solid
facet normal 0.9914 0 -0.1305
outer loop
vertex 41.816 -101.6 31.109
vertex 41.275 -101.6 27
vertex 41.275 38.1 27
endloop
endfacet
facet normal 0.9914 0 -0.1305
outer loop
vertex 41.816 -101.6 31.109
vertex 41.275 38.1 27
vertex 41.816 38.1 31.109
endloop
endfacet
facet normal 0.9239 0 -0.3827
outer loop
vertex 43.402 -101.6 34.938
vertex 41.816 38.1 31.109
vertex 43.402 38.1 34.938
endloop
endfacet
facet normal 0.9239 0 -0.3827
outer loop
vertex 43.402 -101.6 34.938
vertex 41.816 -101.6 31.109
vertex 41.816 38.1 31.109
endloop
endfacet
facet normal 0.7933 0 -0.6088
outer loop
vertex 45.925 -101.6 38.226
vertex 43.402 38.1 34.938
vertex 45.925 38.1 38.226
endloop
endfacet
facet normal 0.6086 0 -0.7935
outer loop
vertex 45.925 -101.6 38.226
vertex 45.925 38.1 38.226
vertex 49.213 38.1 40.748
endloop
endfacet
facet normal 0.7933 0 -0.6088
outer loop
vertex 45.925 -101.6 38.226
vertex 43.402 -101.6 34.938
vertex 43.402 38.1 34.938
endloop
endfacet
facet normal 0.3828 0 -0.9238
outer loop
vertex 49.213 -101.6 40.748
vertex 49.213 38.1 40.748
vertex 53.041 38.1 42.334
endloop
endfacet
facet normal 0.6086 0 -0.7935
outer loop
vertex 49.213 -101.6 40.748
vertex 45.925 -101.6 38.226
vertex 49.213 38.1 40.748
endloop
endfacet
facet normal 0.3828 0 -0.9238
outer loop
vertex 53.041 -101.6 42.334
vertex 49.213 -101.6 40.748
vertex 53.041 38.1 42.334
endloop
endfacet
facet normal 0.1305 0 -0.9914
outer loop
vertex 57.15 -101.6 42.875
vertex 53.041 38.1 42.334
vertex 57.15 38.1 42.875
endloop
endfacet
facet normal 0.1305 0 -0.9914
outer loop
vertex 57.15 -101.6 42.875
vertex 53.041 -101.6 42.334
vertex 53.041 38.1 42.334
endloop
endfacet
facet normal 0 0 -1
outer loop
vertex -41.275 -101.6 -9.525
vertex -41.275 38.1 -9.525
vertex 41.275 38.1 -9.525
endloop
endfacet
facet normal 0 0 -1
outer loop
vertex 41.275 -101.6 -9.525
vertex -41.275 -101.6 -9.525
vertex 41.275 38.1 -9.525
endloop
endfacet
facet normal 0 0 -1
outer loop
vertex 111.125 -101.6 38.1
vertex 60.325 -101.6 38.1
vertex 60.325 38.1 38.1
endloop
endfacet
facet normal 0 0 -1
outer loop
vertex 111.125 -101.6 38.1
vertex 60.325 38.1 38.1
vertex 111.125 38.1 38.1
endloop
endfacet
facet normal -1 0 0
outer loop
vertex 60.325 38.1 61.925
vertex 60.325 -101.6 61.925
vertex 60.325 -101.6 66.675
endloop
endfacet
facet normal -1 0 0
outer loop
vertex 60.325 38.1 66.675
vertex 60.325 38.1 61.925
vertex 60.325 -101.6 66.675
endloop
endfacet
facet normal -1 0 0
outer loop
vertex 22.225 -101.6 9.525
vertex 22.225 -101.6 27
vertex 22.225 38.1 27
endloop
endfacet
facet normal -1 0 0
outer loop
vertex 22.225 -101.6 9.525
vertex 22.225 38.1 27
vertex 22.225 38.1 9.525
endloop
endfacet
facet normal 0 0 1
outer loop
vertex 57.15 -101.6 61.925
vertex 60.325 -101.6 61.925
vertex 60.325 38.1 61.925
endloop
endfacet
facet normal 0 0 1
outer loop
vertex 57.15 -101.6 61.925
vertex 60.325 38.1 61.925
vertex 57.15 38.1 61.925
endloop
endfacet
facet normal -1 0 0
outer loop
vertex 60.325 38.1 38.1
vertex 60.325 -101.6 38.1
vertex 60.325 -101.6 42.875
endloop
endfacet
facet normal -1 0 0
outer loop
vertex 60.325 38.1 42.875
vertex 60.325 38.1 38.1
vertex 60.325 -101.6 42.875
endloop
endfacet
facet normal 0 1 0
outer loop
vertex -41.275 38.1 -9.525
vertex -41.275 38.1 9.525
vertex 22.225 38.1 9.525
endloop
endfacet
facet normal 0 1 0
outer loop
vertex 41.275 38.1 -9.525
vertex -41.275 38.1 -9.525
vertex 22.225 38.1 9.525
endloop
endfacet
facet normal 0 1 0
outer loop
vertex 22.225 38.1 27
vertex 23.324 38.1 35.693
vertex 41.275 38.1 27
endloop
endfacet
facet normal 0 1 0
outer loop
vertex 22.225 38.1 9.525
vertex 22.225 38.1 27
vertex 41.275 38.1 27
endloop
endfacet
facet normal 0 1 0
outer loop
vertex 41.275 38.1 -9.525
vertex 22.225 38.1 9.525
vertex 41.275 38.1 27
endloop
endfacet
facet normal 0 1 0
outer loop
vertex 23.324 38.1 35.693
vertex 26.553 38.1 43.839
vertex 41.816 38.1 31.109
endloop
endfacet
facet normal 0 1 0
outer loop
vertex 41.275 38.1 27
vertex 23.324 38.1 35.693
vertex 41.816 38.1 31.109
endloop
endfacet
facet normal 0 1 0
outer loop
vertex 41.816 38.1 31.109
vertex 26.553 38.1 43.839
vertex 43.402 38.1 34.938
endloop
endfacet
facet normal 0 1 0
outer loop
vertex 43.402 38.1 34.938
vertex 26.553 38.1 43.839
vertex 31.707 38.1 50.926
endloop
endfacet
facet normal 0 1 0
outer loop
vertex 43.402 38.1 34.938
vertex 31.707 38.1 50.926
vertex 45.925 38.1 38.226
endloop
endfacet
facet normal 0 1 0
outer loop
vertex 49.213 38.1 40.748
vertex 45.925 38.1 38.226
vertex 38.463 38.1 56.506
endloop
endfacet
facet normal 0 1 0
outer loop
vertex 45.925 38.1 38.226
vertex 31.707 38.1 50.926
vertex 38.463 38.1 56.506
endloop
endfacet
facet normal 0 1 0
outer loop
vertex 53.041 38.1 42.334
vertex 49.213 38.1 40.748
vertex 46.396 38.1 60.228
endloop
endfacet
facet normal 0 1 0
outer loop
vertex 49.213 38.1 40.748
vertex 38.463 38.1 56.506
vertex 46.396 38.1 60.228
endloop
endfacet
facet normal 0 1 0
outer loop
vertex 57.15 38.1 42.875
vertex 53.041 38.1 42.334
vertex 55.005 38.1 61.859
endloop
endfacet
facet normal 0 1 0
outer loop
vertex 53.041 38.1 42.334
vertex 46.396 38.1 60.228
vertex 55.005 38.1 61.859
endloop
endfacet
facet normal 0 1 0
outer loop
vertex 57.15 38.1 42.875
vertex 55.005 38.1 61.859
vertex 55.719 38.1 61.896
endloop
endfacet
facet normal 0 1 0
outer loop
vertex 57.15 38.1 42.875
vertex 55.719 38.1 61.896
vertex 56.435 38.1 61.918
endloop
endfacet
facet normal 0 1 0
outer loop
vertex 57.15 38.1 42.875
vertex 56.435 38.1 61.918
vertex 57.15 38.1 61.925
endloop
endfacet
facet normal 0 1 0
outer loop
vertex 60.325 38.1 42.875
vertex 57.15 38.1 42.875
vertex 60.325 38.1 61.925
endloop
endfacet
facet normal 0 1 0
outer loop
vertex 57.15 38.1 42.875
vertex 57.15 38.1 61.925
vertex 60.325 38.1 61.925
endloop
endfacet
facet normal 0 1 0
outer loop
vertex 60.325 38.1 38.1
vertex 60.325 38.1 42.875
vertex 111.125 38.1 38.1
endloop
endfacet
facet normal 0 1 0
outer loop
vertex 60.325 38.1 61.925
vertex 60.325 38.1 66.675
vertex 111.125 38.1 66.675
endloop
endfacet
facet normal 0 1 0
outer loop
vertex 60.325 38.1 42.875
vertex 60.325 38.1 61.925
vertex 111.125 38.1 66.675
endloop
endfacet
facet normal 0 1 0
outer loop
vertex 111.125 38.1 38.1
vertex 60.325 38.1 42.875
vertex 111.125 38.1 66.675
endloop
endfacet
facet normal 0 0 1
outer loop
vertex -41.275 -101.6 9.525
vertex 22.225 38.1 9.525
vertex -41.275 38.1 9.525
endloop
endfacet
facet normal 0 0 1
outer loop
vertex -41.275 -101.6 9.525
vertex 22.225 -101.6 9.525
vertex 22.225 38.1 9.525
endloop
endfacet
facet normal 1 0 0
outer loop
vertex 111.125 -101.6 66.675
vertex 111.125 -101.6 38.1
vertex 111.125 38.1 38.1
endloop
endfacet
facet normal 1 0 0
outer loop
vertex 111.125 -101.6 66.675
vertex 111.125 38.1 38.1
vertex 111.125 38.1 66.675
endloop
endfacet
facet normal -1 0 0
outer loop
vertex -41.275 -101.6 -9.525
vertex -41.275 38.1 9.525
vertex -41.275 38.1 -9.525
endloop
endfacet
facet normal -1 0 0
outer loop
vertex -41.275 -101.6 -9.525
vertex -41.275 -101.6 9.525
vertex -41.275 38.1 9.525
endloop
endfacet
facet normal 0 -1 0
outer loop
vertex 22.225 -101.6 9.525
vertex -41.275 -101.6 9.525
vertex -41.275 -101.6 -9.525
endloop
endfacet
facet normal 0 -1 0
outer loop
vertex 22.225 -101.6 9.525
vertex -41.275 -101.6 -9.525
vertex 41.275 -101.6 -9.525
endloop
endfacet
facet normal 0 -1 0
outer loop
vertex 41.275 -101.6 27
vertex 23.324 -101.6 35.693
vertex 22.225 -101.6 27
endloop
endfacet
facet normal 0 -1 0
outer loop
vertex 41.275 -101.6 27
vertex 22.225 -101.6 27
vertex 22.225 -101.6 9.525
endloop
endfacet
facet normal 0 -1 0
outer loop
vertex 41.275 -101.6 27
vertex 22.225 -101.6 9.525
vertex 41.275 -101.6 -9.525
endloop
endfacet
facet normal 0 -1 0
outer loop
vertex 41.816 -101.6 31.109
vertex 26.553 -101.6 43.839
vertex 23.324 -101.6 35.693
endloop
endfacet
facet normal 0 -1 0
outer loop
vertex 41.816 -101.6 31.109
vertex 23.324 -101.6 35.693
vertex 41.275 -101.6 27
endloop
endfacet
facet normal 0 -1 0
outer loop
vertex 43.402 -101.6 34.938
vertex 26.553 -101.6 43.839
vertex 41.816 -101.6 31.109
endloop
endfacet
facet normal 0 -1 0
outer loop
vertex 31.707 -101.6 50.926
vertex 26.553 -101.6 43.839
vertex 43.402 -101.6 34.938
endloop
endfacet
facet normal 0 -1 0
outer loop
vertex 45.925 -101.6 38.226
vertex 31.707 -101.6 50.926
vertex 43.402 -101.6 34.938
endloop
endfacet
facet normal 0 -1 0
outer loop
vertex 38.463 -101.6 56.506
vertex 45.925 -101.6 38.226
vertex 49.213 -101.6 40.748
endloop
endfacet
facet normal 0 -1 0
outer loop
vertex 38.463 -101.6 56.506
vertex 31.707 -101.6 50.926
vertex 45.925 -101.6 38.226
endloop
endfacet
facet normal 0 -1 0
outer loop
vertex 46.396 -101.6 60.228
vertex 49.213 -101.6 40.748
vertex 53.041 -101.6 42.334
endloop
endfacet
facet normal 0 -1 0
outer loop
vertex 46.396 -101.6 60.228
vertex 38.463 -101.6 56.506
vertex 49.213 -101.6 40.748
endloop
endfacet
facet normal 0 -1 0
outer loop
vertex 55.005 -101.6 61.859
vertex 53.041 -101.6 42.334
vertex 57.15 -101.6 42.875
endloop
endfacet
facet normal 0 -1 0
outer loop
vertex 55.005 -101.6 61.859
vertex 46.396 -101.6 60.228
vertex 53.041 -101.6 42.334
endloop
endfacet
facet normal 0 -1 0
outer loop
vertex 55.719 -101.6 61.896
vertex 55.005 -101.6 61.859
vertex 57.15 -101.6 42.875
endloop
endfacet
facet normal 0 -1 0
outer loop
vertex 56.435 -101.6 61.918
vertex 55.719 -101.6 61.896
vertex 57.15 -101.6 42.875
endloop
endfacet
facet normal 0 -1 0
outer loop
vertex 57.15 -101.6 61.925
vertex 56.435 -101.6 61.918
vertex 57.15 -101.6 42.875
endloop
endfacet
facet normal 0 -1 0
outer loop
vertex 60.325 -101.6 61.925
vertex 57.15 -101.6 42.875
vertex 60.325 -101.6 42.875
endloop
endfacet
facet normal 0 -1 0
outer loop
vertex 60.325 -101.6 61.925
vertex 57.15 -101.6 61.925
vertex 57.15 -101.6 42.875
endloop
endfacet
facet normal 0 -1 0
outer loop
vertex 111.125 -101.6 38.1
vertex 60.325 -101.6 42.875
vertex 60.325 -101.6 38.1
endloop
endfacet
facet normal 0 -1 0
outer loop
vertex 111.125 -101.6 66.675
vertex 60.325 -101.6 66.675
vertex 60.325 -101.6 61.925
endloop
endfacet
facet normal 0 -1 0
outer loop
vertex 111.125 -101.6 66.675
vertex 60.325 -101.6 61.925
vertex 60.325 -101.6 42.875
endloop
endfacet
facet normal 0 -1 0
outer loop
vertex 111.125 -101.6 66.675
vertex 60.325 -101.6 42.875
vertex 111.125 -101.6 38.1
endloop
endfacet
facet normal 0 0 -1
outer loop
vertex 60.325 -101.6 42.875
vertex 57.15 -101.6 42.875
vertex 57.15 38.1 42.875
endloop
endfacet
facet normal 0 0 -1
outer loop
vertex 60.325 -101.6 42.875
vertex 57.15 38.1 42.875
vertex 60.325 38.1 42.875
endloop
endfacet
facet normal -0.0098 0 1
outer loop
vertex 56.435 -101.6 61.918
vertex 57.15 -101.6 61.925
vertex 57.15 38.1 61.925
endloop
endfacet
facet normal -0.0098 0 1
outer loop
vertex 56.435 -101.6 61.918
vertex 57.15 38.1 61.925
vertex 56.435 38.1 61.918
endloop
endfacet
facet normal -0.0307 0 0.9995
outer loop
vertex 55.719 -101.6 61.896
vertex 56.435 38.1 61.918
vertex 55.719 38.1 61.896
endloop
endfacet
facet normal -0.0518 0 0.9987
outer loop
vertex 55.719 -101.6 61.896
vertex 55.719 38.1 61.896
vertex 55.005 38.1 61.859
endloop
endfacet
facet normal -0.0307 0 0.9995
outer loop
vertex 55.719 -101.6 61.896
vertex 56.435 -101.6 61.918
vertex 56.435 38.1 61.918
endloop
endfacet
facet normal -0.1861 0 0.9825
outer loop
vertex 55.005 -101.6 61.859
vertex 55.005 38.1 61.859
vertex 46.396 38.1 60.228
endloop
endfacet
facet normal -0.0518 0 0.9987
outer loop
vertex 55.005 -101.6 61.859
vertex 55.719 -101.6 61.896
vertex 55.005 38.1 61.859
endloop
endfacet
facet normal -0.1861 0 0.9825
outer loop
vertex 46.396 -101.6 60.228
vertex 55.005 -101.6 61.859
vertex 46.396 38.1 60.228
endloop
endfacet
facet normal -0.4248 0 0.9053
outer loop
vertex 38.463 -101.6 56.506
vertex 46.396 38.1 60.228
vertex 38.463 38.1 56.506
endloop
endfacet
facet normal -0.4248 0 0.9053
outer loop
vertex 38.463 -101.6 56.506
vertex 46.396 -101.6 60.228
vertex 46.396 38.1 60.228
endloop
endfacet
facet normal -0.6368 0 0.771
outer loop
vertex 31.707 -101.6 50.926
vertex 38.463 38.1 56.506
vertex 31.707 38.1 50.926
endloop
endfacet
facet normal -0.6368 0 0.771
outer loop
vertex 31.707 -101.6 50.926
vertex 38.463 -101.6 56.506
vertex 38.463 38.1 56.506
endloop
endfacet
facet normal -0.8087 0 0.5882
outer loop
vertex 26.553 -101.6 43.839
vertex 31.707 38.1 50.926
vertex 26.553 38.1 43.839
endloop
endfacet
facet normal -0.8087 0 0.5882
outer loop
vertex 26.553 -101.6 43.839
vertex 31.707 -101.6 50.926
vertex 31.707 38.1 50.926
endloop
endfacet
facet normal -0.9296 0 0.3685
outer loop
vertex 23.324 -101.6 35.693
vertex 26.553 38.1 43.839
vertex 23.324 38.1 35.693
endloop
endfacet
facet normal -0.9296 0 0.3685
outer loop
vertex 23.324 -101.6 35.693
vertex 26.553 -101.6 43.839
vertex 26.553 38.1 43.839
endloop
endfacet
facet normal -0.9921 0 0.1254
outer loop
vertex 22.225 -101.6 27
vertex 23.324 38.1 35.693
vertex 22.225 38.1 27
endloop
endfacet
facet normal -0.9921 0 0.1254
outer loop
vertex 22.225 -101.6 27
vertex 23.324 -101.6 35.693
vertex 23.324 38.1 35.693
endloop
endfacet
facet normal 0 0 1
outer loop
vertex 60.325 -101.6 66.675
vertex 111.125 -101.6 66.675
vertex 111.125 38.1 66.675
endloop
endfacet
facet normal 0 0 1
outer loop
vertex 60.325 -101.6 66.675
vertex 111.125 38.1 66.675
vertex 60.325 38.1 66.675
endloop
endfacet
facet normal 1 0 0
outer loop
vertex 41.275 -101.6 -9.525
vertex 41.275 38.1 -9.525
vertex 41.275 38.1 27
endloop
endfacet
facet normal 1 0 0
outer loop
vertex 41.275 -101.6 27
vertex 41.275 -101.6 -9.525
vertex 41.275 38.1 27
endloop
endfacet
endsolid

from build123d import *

# Parameters (mm, degrees)
F0_W     = 25.4
F0_H     = 4.7498
F0_H_2   = 4.7752
F0_H_3   = 19.05
F1_DEPTH = 25.4
F2_DEPTH = 63.5
F3_DEPTH = 12.7


with BuildPart() as f1:
    # F0 (on Front) → F1 (new body, symmetric)
    with BuildSketch(Plane.XZ):
        with Locations((73.025, 64.3001)):
            Rectangle(F0_W, F0_H)
        with Locations((73.025, 40.4876)):
            Rectangle(F0_W, F0_H_2)
        with BuildLine():
            Line((22.225, 9.525), (41.275, 9.525))
            Line((41.275, 9.525), (41.275, 27.0002))
            ThreePointArc((41.275, 27.0002), (45.9246798487, 38.2255201513), (57.15, 42.8752))
            Line((57.15, 42.8752), (60.325, 42.8752))
            Line((60.325, 42.8752), (60.325, 61.9252))
            Line((60.325, 61.9252), (57.15, 61.9252))
            add(Edge.make_bspline(
                [(55.0049951234, 61.8592673868), (55.7203693302, 61.8825211743), (56.4354212261, 61.9044283334), (57.15, 61.9252)],
                knots=[109.5299309045, 109.5299309045, 109.5299309045, 109.5299309045, 111.5045361635, 111.5045361635, 111.5045361635, 111.5045361635], degree=3))
            ThreePointArc((55.0049951234, 61.8592673868), (31.7072218467, 50.9255143102), (22.225, 27.0002))
            Line((22.225, 27.0002), (22.225, 9.525))
        make_face()
        with Locations((73.025, 52.4002)):
            Rectangle(F0_W, F0_H_3)
        Polygon((85.725, 61.9252), (85.725, 42.8752), (85.725, 38.1), (111.125, 38.1), (111.125, 66.675), (85.725, 66.675), align=None)
        with BuildLine():
            ThreePointArc((57.15, 61.9252), (56.0769910263, 61.9087129552), (55.0049951234, 61.8592673868))
            add(Edge.make_bspline(
                [(55.0049951234, 61.8592673868), (55.7203693302, 61.8825211743), (56.4354212261, 61.9044283334), (57.15, 61.9252)],
                knots=[109.5299309045, 109.5299309045, 109.5299309045, 109.5299309045, 111.5045361635, 111.5045361635, 111.5045361635, 111.5045361635], degree=3))
        make_face()
        Polygon((41.275, -9.525), (41.275, 9.525), (22.225, 9.525), (-41.275, 9.525), (-41.275, -9.525), align=None)
    extrude(amount=F1_DEPTH, both=True)

    # F2 (add, symmetric): a face of the model
    f2_faces = [f1.faces().sort_by_distance(p)[0] for p in [
        (40.4852696712, -25.4, 28.4092448442),
    ]]
    extrude(f2_faces, amount=F2_DEPTH, both=True)

    # F3 (add, symmetric): a face of the model
    f3_faces = [f1.faces().sort_by_distance(p)[0] for p in [
        (40.4852696712, -88.9, 28.4092448442),
    ]]
    extrude(f3_faces, amount=F3_DEPTH, both=True)


solid = f1.part
